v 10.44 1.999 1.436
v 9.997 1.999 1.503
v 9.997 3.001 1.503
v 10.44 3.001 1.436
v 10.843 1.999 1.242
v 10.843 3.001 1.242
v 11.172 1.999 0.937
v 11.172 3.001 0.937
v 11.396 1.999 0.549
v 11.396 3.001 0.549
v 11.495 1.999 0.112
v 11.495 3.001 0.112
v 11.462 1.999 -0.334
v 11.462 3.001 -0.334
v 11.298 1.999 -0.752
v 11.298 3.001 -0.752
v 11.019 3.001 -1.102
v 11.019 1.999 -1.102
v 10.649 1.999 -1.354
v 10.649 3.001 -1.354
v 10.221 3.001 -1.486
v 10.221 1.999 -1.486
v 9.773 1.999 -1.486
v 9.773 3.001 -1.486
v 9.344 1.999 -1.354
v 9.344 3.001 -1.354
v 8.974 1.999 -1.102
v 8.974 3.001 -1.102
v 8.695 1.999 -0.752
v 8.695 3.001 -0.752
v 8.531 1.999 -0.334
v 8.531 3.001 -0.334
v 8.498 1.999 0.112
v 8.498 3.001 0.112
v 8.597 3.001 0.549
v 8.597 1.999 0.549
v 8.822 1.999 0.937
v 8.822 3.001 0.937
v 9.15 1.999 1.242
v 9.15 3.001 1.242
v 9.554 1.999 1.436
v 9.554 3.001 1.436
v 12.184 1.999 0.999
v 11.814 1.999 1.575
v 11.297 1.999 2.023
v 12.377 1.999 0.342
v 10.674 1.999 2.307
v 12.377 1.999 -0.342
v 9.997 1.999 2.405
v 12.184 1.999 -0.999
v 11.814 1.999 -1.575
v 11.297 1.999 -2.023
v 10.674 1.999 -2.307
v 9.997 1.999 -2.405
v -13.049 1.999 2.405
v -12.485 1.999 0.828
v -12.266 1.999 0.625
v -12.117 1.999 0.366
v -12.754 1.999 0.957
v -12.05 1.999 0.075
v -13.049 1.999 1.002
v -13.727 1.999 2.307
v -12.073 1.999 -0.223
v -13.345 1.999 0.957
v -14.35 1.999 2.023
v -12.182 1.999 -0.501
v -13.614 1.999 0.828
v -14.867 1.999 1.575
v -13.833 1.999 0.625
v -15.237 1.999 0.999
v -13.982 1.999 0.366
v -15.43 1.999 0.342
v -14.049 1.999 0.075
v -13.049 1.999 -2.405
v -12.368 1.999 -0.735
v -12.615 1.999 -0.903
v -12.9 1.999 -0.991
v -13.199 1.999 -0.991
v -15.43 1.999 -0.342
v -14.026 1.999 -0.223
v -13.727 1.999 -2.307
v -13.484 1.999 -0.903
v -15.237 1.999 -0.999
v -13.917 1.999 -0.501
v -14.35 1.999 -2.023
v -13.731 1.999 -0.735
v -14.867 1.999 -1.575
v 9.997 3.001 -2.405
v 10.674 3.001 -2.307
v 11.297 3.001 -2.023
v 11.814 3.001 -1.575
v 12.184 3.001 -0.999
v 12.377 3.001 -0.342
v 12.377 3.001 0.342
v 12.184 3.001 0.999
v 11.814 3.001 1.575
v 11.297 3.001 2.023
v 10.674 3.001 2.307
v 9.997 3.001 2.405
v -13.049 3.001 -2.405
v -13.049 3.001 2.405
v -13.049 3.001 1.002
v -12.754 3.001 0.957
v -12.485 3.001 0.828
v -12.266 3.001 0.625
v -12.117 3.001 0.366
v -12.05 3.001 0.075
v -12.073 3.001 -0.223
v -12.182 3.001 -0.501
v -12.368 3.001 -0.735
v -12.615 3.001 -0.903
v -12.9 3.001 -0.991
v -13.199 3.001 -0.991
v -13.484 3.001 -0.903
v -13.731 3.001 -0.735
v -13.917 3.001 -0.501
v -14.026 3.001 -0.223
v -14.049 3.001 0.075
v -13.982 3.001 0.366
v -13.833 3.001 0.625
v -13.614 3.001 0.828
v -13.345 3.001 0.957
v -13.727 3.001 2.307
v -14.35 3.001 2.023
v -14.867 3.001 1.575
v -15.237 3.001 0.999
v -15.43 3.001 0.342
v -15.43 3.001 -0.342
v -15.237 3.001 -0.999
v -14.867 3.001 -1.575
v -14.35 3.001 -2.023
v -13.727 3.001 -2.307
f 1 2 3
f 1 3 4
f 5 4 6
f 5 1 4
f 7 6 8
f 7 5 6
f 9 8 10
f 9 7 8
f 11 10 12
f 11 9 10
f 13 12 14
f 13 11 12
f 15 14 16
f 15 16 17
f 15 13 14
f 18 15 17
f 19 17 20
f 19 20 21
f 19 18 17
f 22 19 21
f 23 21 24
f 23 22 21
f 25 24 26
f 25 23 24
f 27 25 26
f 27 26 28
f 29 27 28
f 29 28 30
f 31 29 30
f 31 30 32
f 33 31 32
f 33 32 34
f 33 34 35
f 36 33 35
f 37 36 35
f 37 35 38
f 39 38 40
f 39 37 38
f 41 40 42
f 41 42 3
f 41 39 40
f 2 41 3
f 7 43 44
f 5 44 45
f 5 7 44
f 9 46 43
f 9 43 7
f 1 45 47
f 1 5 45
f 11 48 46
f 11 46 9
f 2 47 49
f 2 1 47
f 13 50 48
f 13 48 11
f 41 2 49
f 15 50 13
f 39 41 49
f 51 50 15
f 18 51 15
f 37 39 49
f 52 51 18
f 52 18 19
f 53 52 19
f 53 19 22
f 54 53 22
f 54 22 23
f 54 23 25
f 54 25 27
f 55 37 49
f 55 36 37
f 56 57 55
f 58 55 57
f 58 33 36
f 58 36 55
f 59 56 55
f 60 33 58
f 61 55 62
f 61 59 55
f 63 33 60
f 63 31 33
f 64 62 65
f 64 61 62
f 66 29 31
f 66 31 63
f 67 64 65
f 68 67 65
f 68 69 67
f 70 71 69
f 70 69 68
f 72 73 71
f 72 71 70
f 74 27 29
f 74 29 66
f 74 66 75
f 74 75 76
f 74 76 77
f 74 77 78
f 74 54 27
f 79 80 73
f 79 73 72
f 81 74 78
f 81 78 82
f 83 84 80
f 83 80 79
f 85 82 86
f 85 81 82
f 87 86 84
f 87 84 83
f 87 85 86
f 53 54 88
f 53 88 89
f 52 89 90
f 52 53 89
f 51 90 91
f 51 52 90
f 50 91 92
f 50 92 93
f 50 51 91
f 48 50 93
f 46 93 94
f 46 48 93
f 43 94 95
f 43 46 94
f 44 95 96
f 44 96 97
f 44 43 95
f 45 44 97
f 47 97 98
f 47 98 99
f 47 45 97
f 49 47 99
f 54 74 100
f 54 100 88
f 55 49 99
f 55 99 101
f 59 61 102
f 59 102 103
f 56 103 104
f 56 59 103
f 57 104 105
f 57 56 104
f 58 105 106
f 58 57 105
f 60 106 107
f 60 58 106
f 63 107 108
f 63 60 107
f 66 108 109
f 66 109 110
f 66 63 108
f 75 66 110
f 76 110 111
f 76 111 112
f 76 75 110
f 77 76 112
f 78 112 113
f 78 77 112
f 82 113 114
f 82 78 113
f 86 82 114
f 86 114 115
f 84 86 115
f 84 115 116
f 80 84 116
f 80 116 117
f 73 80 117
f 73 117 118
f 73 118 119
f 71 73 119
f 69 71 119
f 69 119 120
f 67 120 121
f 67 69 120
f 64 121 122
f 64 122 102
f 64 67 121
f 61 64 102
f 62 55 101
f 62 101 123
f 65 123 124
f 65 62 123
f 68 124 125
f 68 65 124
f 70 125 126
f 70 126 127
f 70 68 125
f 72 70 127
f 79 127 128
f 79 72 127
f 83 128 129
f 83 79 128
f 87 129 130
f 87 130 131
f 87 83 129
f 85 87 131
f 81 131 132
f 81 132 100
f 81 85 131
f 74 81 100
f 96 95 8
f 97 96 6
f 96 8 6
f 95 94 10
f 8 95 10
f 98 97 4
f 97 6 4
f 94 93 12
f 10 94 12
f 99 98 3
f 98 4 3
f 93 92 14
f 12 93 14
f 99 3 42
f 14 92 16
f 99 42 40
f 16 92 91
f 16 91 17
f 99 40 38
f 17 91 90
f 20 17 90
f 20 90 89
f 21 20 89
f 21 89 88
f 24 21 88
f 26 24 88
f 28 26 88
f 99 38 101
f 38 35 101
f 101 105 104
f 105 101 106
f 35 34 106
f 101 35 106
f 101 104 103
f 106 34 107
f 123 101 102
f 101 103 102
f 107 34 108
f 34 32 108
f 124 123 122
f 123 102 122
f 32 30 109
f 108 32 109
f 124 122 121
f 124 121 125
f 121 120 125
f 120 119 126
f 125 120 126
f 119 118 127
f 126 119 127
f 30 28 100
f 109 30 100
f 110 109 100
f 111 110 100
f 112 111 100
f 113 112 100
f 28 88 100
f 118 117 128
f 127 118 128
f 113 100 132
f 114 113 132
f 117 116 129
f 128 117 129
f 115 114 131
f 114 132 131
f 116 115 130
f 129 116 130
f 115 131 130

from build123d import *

# Parameters (mm, degrees)
SKETCH1_R           = 5
SKETCH1_R_2         = 7.5
BOSS_EXTRUDE1_DEPTH = 5
SCALE2_SCALE        = 0.2004


with BuildPart() as part:
    # Sketch1 → Boss-Extrude1 (new body)
    with BuildSketch(Plane(origin=(0, 0, 0), x_dir=(1, 0, 0), z_dir=(0, 1, 0))):
        with BuildLine():
            Line((-57.5, 12), (57.5, 12))
            ThreePointArc((57.5, 12), (69.5, 0), (57.5, -12))
            Line((57.5, -12), (-57.5, -12))
            ThreePointArc((-57.5, -12), (-69.5, 0), (-57.5, 12))
        make_face()
        with Locations(Location((-57.5, 0, 0), (0, 0, 270))):
            Circle(SKETCH1_R, mode=Mode.SUBTRACT)
        with Locations(Location((57.5, 0, 0), (0, 0, 270))):
            Circle(SKETCH1_R_2, mode=Mode.SUBTRACT)
    extrude(amount=BOSS_EXTRUDE1_DEPTH)


with BuildPart() as part_1:
    # Scale2: scaled about (-1.908958981, 2.5, 0)
    add(part.part.scale(SCALE2_SCALE).moved(Location((-1.526403601, 1.999, 0))))


solid = part_1.part
